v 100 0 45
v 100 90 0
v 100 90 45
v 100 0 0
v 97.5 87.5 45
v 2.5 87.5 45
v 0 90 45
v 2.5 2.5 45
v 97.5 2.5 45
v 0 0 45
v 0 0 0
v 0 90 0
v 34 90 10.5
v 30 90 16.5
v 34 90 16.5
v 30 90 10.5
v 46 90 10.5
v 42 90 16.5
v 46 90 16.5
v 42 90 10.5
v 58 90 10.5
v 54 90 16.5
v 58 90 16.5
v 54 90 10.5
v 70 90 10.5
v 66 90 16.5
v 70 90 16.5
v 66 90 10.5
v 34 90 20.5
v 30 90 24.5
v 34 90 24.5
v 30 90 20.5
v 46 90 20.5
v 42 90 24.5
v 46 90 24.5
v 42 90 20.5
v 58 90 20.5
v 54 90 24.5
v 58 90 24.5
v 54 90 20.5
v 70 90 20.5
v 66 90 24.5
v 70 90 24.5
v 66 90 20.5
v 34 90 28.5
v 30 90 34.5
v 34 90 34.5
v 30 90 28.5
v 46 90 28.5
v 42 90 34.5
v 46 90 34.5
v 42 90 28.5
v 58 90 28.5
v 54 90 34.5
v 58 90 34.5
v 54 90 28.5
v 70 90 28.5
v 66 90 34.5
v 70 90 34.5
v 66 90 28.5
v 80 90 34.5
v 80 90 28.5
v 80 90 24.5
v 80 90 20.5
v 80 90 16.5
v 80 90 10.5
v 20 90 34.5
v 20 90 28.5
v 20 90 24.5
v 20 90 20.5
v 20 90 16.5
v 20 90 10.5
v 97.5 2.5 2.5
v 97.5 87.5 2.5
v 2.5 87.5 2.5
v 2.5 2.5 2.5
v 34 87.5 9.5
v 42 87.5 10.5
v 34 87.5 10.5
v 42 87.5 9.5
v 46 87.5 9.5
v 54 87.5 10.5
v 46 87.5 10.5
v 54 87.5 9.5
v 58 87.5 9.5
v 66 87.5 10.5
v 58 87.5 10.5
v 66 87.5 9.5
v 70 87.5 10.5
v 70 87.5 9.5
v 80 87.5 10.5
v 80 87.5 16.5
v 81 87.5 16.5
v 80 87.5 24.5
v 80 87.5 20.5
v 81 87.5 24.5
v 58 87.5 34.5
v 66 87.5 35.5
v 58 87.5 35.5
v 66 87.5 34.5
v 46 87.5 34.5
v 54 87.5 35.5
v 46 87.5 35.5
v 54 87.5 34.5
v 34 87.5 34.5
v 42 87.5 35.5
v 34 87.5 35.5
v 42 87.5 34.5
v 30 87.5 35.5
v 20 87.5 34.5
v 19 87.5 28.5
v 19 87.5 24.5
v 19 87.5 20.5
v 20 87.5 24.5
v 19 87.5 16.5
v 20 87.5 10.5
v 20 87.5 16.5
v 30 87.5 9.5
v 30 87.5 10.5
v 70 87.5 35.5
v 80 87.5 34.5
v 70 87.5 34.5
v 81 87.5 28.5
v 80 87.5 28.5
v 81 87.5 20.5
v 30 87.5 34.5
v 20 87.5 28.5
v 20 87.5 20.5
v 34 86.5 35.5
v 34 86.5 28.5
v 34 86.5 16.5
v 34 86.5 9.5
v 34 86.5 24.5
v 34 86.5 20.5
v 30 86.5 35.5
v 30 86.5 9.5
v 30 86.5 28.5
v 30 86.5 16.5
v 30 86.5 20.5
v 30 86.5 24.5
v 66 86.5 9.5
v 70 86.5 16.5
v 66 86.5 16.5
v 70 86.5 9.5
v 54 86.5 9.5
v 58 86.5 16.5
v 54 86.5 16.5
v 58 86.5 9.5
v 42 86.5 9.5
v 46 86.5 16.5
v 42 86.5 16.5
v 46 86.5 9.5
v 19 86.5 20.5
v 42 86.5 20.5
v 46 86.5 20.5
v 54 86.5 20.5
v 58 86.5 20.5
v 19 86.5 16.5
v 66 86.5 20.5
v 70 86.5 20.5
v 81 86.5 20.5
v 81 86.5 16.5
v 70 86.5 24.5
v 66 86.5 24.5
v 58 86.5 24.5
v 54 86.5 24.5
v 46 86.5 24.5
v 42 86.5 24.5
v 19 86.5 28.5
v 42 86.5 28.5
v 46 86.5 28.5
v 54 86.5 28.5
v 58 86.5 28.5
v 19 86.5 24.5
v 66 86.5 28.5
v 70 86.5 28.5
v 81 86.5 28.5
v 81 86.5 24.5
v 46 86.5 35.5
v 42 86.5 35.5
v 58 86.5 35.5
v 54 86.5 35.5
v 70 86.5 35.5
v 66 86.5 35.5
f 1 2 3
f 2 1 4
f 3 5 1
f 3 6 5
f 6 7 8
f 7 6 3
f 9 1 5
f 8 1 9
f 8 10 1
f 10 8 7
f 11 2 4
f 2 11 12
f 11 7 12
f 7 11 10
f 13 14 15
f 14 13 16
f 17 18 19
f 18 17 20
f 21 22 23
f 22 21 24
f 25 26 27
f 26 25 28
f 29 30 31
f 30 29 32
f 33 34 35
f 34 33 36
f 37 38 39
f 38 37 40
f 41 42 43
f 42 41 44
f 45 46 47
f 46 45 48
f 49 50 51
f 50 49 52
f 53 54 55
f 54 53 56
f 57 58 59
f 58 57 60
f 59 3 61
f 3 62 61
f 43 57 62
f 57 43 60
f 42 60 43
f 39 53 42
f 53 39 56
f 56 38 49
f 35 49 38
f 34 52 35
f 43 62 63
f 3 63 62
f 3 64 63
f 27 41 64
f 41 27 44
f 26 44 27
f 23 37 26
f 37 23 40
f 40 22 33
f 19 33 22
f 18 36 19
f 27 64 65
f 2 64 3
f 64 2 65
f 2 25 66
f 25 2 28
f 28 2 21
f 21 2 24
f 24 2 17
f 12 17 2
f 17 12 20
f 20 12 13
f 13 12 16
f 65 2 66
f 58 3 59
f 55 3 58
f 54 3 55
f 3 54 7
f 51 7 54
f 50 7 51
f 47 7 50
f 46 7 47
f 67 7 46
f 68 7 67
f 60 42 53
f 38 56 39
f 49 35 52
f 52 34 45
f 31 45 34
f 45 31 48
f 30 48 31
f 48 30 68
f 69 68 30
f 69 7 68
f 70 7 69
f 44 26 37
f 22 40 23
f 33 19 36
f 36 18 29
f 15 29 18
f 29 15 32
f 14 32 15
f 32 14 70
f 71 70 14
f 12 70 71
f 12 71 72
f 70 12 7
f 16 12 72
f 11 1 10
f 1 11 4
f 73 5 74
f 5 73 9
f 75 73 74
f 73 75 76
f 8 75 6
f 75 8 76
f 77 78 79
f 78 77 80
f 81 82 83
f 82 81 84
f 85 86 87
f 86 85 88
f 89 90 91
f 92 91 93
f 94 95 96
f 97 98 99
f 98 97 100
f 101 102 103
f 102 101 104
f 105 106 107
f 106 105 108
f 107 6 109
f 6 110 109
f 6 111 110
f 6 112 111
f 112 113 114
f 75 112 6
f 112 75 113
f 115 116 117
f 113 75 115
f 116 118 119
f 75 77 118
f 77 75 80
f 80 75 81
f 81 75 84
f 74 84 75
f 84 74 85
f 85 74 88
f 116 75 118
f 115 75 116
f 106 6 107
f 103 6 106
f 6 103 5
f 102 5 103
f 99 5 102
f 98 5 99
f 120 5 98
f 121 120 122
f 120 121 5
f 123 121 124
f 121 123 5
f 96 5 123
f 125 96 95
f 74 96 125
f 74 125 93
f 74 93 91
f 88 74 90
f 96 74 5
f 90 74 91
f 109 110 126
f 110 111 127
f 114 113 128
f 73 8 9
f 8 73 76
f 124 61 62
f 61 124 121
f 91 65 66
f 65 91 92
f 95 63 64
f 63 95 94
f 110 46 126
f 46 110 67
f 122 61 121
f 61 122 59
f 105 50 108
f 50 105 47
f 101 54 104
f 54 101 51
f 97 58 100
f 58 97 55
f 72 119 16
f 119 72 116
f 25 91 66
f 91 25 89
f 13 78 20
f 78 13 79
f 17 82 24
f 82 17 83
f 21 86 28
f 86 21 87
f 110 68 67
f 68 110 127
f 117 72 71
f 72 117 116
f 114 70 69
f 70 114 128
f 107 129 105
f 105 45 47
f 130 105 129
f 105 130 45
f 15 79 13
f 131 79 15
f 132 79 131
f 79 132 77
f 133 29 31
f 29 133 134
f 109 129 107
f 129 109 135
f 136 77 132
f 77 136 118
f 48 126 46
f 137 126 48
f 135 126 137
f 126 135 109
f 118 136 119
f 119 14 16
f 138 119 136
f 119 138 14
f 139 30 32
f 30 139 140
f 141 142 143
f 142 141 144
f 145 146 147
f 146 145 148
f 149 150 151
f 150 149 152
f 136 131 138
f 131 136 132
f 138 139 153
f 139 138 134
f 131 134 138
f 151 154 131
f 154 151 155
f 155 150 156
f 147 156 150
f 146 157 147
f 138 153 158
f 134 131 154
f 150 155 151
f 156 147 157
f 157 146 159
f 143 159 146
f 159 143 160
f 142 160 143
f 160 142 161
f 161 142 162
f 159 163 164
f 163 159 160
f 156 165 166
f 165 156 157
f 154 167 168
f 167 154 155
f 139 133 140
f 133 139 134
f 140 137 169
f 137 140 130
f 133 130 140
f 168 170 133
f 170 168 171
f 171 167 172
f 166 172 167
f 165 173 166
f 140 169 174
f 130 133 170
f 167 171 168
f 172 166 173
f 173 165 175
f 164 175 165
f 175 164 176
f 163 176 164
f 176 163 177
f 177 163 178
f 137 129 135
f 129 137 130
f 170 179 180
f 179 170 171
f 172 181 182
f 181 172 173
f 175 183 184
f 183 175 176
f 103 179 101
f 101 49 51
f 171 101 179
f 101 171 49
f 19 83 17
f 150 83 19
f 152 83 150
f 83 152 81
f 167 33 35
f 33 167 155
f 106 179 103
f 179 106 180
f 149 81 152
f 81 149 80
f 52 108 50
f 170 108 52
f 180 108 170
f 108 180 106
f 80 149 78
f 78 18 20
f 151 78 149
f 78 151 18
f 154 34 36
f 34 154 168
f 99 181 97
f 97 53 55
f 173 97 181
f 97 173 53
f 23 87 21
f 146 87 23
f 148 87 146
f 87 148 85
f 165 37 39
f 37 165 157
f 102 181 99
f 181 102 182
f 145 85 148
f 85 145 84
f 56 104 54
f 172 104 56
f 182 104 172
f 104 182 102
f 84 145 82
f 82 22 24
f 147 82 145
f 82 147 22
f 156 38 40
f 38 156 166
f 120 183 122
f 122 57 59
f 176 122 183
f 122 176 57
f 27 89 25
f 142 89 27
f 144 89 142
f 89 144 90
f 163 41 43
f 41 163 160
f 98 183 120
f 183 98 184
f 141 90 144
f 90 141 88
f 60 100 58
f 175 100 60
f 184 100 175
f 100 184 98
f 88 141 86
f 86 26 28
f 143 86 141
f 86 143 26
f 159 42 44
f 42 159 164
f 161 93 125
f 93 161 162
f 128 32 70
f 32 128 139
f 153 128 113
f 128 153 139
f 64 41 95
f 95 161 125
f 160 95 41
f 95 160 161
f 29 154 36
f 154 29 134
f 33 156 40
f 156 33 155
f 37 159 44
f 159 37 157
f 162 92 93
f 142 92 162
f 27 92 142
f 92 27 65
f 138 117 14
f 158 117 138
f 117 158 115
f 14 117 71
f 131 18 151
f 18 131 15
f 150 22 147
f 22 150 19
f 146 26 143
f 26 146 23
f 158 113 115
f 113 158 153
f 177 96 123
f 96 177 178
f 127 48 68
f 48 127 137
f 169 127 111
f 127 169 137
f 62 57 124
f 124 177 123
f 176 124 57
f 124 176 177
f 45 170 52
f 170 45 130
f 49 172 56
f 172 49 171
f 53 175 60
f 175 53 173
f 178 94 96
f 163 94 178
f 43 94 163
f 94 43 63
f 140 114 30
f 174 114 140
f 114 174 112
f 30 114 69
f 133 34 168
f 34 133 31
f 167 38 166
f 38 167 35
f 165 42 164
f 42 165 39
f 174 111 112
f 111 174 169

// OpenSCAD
$fn = 32;

// ----------------------------------------------------------------------
// Vent box: crossgrid enclosure
// ----------------------------------------------------------------------

// --- parameters (mm) ---
box_l = 100;              // box length, X
box_w = 90;               // box width, Y
box_h = 45;               // box height, Z
wall_t = 2.5;             // shell wall thickness
win_l = 60;               // vent window width, X
win_h = 24;               // vent window height, Z
bar_w = 4;                // grid bar width
n_v = 4;                  // vertical bar count
n_h = 2;                  // horizontal bar count

win_z0 = (box_h - win_h) / 2;  // window lower edge Z
v_step = win_l / (n_v + 1);  // vertical bar step
h_step = win_h / (n_h + 1);  // horizontal bar step

difference() {
  union() {
    difference() {
      cube([box_l, box_w, box_h]);
  translate([wall_t, wall_t, wall_t])
    cube([box_l - 2 * wall_t, box_w - 2 * wall_t, box_h]);
  translate([(box_l - win_l) / 2, box_w - wall_t - 1, win_z0])
    cube([win_l, wall_t + 2, win_h]);
    }
    for (i = [1 : n_v])
      translate([(box_l - win_l) / 2 + i * v_step - bar_w / 2,
                 box_w - wall_t - 1, win_z0 - 1])
        cube([bar_w, wall_t + 1, win_h + 2]);
    for (i = [1 : n_h])
      translate([(box_l - win_l) / 2 - 1, box_w - wall_t - 1,
                 win_z0 + i * h_step - bar_w / 2])
        cube([win_l + 2, wall_t + 1, bar_w]);
  }
}
